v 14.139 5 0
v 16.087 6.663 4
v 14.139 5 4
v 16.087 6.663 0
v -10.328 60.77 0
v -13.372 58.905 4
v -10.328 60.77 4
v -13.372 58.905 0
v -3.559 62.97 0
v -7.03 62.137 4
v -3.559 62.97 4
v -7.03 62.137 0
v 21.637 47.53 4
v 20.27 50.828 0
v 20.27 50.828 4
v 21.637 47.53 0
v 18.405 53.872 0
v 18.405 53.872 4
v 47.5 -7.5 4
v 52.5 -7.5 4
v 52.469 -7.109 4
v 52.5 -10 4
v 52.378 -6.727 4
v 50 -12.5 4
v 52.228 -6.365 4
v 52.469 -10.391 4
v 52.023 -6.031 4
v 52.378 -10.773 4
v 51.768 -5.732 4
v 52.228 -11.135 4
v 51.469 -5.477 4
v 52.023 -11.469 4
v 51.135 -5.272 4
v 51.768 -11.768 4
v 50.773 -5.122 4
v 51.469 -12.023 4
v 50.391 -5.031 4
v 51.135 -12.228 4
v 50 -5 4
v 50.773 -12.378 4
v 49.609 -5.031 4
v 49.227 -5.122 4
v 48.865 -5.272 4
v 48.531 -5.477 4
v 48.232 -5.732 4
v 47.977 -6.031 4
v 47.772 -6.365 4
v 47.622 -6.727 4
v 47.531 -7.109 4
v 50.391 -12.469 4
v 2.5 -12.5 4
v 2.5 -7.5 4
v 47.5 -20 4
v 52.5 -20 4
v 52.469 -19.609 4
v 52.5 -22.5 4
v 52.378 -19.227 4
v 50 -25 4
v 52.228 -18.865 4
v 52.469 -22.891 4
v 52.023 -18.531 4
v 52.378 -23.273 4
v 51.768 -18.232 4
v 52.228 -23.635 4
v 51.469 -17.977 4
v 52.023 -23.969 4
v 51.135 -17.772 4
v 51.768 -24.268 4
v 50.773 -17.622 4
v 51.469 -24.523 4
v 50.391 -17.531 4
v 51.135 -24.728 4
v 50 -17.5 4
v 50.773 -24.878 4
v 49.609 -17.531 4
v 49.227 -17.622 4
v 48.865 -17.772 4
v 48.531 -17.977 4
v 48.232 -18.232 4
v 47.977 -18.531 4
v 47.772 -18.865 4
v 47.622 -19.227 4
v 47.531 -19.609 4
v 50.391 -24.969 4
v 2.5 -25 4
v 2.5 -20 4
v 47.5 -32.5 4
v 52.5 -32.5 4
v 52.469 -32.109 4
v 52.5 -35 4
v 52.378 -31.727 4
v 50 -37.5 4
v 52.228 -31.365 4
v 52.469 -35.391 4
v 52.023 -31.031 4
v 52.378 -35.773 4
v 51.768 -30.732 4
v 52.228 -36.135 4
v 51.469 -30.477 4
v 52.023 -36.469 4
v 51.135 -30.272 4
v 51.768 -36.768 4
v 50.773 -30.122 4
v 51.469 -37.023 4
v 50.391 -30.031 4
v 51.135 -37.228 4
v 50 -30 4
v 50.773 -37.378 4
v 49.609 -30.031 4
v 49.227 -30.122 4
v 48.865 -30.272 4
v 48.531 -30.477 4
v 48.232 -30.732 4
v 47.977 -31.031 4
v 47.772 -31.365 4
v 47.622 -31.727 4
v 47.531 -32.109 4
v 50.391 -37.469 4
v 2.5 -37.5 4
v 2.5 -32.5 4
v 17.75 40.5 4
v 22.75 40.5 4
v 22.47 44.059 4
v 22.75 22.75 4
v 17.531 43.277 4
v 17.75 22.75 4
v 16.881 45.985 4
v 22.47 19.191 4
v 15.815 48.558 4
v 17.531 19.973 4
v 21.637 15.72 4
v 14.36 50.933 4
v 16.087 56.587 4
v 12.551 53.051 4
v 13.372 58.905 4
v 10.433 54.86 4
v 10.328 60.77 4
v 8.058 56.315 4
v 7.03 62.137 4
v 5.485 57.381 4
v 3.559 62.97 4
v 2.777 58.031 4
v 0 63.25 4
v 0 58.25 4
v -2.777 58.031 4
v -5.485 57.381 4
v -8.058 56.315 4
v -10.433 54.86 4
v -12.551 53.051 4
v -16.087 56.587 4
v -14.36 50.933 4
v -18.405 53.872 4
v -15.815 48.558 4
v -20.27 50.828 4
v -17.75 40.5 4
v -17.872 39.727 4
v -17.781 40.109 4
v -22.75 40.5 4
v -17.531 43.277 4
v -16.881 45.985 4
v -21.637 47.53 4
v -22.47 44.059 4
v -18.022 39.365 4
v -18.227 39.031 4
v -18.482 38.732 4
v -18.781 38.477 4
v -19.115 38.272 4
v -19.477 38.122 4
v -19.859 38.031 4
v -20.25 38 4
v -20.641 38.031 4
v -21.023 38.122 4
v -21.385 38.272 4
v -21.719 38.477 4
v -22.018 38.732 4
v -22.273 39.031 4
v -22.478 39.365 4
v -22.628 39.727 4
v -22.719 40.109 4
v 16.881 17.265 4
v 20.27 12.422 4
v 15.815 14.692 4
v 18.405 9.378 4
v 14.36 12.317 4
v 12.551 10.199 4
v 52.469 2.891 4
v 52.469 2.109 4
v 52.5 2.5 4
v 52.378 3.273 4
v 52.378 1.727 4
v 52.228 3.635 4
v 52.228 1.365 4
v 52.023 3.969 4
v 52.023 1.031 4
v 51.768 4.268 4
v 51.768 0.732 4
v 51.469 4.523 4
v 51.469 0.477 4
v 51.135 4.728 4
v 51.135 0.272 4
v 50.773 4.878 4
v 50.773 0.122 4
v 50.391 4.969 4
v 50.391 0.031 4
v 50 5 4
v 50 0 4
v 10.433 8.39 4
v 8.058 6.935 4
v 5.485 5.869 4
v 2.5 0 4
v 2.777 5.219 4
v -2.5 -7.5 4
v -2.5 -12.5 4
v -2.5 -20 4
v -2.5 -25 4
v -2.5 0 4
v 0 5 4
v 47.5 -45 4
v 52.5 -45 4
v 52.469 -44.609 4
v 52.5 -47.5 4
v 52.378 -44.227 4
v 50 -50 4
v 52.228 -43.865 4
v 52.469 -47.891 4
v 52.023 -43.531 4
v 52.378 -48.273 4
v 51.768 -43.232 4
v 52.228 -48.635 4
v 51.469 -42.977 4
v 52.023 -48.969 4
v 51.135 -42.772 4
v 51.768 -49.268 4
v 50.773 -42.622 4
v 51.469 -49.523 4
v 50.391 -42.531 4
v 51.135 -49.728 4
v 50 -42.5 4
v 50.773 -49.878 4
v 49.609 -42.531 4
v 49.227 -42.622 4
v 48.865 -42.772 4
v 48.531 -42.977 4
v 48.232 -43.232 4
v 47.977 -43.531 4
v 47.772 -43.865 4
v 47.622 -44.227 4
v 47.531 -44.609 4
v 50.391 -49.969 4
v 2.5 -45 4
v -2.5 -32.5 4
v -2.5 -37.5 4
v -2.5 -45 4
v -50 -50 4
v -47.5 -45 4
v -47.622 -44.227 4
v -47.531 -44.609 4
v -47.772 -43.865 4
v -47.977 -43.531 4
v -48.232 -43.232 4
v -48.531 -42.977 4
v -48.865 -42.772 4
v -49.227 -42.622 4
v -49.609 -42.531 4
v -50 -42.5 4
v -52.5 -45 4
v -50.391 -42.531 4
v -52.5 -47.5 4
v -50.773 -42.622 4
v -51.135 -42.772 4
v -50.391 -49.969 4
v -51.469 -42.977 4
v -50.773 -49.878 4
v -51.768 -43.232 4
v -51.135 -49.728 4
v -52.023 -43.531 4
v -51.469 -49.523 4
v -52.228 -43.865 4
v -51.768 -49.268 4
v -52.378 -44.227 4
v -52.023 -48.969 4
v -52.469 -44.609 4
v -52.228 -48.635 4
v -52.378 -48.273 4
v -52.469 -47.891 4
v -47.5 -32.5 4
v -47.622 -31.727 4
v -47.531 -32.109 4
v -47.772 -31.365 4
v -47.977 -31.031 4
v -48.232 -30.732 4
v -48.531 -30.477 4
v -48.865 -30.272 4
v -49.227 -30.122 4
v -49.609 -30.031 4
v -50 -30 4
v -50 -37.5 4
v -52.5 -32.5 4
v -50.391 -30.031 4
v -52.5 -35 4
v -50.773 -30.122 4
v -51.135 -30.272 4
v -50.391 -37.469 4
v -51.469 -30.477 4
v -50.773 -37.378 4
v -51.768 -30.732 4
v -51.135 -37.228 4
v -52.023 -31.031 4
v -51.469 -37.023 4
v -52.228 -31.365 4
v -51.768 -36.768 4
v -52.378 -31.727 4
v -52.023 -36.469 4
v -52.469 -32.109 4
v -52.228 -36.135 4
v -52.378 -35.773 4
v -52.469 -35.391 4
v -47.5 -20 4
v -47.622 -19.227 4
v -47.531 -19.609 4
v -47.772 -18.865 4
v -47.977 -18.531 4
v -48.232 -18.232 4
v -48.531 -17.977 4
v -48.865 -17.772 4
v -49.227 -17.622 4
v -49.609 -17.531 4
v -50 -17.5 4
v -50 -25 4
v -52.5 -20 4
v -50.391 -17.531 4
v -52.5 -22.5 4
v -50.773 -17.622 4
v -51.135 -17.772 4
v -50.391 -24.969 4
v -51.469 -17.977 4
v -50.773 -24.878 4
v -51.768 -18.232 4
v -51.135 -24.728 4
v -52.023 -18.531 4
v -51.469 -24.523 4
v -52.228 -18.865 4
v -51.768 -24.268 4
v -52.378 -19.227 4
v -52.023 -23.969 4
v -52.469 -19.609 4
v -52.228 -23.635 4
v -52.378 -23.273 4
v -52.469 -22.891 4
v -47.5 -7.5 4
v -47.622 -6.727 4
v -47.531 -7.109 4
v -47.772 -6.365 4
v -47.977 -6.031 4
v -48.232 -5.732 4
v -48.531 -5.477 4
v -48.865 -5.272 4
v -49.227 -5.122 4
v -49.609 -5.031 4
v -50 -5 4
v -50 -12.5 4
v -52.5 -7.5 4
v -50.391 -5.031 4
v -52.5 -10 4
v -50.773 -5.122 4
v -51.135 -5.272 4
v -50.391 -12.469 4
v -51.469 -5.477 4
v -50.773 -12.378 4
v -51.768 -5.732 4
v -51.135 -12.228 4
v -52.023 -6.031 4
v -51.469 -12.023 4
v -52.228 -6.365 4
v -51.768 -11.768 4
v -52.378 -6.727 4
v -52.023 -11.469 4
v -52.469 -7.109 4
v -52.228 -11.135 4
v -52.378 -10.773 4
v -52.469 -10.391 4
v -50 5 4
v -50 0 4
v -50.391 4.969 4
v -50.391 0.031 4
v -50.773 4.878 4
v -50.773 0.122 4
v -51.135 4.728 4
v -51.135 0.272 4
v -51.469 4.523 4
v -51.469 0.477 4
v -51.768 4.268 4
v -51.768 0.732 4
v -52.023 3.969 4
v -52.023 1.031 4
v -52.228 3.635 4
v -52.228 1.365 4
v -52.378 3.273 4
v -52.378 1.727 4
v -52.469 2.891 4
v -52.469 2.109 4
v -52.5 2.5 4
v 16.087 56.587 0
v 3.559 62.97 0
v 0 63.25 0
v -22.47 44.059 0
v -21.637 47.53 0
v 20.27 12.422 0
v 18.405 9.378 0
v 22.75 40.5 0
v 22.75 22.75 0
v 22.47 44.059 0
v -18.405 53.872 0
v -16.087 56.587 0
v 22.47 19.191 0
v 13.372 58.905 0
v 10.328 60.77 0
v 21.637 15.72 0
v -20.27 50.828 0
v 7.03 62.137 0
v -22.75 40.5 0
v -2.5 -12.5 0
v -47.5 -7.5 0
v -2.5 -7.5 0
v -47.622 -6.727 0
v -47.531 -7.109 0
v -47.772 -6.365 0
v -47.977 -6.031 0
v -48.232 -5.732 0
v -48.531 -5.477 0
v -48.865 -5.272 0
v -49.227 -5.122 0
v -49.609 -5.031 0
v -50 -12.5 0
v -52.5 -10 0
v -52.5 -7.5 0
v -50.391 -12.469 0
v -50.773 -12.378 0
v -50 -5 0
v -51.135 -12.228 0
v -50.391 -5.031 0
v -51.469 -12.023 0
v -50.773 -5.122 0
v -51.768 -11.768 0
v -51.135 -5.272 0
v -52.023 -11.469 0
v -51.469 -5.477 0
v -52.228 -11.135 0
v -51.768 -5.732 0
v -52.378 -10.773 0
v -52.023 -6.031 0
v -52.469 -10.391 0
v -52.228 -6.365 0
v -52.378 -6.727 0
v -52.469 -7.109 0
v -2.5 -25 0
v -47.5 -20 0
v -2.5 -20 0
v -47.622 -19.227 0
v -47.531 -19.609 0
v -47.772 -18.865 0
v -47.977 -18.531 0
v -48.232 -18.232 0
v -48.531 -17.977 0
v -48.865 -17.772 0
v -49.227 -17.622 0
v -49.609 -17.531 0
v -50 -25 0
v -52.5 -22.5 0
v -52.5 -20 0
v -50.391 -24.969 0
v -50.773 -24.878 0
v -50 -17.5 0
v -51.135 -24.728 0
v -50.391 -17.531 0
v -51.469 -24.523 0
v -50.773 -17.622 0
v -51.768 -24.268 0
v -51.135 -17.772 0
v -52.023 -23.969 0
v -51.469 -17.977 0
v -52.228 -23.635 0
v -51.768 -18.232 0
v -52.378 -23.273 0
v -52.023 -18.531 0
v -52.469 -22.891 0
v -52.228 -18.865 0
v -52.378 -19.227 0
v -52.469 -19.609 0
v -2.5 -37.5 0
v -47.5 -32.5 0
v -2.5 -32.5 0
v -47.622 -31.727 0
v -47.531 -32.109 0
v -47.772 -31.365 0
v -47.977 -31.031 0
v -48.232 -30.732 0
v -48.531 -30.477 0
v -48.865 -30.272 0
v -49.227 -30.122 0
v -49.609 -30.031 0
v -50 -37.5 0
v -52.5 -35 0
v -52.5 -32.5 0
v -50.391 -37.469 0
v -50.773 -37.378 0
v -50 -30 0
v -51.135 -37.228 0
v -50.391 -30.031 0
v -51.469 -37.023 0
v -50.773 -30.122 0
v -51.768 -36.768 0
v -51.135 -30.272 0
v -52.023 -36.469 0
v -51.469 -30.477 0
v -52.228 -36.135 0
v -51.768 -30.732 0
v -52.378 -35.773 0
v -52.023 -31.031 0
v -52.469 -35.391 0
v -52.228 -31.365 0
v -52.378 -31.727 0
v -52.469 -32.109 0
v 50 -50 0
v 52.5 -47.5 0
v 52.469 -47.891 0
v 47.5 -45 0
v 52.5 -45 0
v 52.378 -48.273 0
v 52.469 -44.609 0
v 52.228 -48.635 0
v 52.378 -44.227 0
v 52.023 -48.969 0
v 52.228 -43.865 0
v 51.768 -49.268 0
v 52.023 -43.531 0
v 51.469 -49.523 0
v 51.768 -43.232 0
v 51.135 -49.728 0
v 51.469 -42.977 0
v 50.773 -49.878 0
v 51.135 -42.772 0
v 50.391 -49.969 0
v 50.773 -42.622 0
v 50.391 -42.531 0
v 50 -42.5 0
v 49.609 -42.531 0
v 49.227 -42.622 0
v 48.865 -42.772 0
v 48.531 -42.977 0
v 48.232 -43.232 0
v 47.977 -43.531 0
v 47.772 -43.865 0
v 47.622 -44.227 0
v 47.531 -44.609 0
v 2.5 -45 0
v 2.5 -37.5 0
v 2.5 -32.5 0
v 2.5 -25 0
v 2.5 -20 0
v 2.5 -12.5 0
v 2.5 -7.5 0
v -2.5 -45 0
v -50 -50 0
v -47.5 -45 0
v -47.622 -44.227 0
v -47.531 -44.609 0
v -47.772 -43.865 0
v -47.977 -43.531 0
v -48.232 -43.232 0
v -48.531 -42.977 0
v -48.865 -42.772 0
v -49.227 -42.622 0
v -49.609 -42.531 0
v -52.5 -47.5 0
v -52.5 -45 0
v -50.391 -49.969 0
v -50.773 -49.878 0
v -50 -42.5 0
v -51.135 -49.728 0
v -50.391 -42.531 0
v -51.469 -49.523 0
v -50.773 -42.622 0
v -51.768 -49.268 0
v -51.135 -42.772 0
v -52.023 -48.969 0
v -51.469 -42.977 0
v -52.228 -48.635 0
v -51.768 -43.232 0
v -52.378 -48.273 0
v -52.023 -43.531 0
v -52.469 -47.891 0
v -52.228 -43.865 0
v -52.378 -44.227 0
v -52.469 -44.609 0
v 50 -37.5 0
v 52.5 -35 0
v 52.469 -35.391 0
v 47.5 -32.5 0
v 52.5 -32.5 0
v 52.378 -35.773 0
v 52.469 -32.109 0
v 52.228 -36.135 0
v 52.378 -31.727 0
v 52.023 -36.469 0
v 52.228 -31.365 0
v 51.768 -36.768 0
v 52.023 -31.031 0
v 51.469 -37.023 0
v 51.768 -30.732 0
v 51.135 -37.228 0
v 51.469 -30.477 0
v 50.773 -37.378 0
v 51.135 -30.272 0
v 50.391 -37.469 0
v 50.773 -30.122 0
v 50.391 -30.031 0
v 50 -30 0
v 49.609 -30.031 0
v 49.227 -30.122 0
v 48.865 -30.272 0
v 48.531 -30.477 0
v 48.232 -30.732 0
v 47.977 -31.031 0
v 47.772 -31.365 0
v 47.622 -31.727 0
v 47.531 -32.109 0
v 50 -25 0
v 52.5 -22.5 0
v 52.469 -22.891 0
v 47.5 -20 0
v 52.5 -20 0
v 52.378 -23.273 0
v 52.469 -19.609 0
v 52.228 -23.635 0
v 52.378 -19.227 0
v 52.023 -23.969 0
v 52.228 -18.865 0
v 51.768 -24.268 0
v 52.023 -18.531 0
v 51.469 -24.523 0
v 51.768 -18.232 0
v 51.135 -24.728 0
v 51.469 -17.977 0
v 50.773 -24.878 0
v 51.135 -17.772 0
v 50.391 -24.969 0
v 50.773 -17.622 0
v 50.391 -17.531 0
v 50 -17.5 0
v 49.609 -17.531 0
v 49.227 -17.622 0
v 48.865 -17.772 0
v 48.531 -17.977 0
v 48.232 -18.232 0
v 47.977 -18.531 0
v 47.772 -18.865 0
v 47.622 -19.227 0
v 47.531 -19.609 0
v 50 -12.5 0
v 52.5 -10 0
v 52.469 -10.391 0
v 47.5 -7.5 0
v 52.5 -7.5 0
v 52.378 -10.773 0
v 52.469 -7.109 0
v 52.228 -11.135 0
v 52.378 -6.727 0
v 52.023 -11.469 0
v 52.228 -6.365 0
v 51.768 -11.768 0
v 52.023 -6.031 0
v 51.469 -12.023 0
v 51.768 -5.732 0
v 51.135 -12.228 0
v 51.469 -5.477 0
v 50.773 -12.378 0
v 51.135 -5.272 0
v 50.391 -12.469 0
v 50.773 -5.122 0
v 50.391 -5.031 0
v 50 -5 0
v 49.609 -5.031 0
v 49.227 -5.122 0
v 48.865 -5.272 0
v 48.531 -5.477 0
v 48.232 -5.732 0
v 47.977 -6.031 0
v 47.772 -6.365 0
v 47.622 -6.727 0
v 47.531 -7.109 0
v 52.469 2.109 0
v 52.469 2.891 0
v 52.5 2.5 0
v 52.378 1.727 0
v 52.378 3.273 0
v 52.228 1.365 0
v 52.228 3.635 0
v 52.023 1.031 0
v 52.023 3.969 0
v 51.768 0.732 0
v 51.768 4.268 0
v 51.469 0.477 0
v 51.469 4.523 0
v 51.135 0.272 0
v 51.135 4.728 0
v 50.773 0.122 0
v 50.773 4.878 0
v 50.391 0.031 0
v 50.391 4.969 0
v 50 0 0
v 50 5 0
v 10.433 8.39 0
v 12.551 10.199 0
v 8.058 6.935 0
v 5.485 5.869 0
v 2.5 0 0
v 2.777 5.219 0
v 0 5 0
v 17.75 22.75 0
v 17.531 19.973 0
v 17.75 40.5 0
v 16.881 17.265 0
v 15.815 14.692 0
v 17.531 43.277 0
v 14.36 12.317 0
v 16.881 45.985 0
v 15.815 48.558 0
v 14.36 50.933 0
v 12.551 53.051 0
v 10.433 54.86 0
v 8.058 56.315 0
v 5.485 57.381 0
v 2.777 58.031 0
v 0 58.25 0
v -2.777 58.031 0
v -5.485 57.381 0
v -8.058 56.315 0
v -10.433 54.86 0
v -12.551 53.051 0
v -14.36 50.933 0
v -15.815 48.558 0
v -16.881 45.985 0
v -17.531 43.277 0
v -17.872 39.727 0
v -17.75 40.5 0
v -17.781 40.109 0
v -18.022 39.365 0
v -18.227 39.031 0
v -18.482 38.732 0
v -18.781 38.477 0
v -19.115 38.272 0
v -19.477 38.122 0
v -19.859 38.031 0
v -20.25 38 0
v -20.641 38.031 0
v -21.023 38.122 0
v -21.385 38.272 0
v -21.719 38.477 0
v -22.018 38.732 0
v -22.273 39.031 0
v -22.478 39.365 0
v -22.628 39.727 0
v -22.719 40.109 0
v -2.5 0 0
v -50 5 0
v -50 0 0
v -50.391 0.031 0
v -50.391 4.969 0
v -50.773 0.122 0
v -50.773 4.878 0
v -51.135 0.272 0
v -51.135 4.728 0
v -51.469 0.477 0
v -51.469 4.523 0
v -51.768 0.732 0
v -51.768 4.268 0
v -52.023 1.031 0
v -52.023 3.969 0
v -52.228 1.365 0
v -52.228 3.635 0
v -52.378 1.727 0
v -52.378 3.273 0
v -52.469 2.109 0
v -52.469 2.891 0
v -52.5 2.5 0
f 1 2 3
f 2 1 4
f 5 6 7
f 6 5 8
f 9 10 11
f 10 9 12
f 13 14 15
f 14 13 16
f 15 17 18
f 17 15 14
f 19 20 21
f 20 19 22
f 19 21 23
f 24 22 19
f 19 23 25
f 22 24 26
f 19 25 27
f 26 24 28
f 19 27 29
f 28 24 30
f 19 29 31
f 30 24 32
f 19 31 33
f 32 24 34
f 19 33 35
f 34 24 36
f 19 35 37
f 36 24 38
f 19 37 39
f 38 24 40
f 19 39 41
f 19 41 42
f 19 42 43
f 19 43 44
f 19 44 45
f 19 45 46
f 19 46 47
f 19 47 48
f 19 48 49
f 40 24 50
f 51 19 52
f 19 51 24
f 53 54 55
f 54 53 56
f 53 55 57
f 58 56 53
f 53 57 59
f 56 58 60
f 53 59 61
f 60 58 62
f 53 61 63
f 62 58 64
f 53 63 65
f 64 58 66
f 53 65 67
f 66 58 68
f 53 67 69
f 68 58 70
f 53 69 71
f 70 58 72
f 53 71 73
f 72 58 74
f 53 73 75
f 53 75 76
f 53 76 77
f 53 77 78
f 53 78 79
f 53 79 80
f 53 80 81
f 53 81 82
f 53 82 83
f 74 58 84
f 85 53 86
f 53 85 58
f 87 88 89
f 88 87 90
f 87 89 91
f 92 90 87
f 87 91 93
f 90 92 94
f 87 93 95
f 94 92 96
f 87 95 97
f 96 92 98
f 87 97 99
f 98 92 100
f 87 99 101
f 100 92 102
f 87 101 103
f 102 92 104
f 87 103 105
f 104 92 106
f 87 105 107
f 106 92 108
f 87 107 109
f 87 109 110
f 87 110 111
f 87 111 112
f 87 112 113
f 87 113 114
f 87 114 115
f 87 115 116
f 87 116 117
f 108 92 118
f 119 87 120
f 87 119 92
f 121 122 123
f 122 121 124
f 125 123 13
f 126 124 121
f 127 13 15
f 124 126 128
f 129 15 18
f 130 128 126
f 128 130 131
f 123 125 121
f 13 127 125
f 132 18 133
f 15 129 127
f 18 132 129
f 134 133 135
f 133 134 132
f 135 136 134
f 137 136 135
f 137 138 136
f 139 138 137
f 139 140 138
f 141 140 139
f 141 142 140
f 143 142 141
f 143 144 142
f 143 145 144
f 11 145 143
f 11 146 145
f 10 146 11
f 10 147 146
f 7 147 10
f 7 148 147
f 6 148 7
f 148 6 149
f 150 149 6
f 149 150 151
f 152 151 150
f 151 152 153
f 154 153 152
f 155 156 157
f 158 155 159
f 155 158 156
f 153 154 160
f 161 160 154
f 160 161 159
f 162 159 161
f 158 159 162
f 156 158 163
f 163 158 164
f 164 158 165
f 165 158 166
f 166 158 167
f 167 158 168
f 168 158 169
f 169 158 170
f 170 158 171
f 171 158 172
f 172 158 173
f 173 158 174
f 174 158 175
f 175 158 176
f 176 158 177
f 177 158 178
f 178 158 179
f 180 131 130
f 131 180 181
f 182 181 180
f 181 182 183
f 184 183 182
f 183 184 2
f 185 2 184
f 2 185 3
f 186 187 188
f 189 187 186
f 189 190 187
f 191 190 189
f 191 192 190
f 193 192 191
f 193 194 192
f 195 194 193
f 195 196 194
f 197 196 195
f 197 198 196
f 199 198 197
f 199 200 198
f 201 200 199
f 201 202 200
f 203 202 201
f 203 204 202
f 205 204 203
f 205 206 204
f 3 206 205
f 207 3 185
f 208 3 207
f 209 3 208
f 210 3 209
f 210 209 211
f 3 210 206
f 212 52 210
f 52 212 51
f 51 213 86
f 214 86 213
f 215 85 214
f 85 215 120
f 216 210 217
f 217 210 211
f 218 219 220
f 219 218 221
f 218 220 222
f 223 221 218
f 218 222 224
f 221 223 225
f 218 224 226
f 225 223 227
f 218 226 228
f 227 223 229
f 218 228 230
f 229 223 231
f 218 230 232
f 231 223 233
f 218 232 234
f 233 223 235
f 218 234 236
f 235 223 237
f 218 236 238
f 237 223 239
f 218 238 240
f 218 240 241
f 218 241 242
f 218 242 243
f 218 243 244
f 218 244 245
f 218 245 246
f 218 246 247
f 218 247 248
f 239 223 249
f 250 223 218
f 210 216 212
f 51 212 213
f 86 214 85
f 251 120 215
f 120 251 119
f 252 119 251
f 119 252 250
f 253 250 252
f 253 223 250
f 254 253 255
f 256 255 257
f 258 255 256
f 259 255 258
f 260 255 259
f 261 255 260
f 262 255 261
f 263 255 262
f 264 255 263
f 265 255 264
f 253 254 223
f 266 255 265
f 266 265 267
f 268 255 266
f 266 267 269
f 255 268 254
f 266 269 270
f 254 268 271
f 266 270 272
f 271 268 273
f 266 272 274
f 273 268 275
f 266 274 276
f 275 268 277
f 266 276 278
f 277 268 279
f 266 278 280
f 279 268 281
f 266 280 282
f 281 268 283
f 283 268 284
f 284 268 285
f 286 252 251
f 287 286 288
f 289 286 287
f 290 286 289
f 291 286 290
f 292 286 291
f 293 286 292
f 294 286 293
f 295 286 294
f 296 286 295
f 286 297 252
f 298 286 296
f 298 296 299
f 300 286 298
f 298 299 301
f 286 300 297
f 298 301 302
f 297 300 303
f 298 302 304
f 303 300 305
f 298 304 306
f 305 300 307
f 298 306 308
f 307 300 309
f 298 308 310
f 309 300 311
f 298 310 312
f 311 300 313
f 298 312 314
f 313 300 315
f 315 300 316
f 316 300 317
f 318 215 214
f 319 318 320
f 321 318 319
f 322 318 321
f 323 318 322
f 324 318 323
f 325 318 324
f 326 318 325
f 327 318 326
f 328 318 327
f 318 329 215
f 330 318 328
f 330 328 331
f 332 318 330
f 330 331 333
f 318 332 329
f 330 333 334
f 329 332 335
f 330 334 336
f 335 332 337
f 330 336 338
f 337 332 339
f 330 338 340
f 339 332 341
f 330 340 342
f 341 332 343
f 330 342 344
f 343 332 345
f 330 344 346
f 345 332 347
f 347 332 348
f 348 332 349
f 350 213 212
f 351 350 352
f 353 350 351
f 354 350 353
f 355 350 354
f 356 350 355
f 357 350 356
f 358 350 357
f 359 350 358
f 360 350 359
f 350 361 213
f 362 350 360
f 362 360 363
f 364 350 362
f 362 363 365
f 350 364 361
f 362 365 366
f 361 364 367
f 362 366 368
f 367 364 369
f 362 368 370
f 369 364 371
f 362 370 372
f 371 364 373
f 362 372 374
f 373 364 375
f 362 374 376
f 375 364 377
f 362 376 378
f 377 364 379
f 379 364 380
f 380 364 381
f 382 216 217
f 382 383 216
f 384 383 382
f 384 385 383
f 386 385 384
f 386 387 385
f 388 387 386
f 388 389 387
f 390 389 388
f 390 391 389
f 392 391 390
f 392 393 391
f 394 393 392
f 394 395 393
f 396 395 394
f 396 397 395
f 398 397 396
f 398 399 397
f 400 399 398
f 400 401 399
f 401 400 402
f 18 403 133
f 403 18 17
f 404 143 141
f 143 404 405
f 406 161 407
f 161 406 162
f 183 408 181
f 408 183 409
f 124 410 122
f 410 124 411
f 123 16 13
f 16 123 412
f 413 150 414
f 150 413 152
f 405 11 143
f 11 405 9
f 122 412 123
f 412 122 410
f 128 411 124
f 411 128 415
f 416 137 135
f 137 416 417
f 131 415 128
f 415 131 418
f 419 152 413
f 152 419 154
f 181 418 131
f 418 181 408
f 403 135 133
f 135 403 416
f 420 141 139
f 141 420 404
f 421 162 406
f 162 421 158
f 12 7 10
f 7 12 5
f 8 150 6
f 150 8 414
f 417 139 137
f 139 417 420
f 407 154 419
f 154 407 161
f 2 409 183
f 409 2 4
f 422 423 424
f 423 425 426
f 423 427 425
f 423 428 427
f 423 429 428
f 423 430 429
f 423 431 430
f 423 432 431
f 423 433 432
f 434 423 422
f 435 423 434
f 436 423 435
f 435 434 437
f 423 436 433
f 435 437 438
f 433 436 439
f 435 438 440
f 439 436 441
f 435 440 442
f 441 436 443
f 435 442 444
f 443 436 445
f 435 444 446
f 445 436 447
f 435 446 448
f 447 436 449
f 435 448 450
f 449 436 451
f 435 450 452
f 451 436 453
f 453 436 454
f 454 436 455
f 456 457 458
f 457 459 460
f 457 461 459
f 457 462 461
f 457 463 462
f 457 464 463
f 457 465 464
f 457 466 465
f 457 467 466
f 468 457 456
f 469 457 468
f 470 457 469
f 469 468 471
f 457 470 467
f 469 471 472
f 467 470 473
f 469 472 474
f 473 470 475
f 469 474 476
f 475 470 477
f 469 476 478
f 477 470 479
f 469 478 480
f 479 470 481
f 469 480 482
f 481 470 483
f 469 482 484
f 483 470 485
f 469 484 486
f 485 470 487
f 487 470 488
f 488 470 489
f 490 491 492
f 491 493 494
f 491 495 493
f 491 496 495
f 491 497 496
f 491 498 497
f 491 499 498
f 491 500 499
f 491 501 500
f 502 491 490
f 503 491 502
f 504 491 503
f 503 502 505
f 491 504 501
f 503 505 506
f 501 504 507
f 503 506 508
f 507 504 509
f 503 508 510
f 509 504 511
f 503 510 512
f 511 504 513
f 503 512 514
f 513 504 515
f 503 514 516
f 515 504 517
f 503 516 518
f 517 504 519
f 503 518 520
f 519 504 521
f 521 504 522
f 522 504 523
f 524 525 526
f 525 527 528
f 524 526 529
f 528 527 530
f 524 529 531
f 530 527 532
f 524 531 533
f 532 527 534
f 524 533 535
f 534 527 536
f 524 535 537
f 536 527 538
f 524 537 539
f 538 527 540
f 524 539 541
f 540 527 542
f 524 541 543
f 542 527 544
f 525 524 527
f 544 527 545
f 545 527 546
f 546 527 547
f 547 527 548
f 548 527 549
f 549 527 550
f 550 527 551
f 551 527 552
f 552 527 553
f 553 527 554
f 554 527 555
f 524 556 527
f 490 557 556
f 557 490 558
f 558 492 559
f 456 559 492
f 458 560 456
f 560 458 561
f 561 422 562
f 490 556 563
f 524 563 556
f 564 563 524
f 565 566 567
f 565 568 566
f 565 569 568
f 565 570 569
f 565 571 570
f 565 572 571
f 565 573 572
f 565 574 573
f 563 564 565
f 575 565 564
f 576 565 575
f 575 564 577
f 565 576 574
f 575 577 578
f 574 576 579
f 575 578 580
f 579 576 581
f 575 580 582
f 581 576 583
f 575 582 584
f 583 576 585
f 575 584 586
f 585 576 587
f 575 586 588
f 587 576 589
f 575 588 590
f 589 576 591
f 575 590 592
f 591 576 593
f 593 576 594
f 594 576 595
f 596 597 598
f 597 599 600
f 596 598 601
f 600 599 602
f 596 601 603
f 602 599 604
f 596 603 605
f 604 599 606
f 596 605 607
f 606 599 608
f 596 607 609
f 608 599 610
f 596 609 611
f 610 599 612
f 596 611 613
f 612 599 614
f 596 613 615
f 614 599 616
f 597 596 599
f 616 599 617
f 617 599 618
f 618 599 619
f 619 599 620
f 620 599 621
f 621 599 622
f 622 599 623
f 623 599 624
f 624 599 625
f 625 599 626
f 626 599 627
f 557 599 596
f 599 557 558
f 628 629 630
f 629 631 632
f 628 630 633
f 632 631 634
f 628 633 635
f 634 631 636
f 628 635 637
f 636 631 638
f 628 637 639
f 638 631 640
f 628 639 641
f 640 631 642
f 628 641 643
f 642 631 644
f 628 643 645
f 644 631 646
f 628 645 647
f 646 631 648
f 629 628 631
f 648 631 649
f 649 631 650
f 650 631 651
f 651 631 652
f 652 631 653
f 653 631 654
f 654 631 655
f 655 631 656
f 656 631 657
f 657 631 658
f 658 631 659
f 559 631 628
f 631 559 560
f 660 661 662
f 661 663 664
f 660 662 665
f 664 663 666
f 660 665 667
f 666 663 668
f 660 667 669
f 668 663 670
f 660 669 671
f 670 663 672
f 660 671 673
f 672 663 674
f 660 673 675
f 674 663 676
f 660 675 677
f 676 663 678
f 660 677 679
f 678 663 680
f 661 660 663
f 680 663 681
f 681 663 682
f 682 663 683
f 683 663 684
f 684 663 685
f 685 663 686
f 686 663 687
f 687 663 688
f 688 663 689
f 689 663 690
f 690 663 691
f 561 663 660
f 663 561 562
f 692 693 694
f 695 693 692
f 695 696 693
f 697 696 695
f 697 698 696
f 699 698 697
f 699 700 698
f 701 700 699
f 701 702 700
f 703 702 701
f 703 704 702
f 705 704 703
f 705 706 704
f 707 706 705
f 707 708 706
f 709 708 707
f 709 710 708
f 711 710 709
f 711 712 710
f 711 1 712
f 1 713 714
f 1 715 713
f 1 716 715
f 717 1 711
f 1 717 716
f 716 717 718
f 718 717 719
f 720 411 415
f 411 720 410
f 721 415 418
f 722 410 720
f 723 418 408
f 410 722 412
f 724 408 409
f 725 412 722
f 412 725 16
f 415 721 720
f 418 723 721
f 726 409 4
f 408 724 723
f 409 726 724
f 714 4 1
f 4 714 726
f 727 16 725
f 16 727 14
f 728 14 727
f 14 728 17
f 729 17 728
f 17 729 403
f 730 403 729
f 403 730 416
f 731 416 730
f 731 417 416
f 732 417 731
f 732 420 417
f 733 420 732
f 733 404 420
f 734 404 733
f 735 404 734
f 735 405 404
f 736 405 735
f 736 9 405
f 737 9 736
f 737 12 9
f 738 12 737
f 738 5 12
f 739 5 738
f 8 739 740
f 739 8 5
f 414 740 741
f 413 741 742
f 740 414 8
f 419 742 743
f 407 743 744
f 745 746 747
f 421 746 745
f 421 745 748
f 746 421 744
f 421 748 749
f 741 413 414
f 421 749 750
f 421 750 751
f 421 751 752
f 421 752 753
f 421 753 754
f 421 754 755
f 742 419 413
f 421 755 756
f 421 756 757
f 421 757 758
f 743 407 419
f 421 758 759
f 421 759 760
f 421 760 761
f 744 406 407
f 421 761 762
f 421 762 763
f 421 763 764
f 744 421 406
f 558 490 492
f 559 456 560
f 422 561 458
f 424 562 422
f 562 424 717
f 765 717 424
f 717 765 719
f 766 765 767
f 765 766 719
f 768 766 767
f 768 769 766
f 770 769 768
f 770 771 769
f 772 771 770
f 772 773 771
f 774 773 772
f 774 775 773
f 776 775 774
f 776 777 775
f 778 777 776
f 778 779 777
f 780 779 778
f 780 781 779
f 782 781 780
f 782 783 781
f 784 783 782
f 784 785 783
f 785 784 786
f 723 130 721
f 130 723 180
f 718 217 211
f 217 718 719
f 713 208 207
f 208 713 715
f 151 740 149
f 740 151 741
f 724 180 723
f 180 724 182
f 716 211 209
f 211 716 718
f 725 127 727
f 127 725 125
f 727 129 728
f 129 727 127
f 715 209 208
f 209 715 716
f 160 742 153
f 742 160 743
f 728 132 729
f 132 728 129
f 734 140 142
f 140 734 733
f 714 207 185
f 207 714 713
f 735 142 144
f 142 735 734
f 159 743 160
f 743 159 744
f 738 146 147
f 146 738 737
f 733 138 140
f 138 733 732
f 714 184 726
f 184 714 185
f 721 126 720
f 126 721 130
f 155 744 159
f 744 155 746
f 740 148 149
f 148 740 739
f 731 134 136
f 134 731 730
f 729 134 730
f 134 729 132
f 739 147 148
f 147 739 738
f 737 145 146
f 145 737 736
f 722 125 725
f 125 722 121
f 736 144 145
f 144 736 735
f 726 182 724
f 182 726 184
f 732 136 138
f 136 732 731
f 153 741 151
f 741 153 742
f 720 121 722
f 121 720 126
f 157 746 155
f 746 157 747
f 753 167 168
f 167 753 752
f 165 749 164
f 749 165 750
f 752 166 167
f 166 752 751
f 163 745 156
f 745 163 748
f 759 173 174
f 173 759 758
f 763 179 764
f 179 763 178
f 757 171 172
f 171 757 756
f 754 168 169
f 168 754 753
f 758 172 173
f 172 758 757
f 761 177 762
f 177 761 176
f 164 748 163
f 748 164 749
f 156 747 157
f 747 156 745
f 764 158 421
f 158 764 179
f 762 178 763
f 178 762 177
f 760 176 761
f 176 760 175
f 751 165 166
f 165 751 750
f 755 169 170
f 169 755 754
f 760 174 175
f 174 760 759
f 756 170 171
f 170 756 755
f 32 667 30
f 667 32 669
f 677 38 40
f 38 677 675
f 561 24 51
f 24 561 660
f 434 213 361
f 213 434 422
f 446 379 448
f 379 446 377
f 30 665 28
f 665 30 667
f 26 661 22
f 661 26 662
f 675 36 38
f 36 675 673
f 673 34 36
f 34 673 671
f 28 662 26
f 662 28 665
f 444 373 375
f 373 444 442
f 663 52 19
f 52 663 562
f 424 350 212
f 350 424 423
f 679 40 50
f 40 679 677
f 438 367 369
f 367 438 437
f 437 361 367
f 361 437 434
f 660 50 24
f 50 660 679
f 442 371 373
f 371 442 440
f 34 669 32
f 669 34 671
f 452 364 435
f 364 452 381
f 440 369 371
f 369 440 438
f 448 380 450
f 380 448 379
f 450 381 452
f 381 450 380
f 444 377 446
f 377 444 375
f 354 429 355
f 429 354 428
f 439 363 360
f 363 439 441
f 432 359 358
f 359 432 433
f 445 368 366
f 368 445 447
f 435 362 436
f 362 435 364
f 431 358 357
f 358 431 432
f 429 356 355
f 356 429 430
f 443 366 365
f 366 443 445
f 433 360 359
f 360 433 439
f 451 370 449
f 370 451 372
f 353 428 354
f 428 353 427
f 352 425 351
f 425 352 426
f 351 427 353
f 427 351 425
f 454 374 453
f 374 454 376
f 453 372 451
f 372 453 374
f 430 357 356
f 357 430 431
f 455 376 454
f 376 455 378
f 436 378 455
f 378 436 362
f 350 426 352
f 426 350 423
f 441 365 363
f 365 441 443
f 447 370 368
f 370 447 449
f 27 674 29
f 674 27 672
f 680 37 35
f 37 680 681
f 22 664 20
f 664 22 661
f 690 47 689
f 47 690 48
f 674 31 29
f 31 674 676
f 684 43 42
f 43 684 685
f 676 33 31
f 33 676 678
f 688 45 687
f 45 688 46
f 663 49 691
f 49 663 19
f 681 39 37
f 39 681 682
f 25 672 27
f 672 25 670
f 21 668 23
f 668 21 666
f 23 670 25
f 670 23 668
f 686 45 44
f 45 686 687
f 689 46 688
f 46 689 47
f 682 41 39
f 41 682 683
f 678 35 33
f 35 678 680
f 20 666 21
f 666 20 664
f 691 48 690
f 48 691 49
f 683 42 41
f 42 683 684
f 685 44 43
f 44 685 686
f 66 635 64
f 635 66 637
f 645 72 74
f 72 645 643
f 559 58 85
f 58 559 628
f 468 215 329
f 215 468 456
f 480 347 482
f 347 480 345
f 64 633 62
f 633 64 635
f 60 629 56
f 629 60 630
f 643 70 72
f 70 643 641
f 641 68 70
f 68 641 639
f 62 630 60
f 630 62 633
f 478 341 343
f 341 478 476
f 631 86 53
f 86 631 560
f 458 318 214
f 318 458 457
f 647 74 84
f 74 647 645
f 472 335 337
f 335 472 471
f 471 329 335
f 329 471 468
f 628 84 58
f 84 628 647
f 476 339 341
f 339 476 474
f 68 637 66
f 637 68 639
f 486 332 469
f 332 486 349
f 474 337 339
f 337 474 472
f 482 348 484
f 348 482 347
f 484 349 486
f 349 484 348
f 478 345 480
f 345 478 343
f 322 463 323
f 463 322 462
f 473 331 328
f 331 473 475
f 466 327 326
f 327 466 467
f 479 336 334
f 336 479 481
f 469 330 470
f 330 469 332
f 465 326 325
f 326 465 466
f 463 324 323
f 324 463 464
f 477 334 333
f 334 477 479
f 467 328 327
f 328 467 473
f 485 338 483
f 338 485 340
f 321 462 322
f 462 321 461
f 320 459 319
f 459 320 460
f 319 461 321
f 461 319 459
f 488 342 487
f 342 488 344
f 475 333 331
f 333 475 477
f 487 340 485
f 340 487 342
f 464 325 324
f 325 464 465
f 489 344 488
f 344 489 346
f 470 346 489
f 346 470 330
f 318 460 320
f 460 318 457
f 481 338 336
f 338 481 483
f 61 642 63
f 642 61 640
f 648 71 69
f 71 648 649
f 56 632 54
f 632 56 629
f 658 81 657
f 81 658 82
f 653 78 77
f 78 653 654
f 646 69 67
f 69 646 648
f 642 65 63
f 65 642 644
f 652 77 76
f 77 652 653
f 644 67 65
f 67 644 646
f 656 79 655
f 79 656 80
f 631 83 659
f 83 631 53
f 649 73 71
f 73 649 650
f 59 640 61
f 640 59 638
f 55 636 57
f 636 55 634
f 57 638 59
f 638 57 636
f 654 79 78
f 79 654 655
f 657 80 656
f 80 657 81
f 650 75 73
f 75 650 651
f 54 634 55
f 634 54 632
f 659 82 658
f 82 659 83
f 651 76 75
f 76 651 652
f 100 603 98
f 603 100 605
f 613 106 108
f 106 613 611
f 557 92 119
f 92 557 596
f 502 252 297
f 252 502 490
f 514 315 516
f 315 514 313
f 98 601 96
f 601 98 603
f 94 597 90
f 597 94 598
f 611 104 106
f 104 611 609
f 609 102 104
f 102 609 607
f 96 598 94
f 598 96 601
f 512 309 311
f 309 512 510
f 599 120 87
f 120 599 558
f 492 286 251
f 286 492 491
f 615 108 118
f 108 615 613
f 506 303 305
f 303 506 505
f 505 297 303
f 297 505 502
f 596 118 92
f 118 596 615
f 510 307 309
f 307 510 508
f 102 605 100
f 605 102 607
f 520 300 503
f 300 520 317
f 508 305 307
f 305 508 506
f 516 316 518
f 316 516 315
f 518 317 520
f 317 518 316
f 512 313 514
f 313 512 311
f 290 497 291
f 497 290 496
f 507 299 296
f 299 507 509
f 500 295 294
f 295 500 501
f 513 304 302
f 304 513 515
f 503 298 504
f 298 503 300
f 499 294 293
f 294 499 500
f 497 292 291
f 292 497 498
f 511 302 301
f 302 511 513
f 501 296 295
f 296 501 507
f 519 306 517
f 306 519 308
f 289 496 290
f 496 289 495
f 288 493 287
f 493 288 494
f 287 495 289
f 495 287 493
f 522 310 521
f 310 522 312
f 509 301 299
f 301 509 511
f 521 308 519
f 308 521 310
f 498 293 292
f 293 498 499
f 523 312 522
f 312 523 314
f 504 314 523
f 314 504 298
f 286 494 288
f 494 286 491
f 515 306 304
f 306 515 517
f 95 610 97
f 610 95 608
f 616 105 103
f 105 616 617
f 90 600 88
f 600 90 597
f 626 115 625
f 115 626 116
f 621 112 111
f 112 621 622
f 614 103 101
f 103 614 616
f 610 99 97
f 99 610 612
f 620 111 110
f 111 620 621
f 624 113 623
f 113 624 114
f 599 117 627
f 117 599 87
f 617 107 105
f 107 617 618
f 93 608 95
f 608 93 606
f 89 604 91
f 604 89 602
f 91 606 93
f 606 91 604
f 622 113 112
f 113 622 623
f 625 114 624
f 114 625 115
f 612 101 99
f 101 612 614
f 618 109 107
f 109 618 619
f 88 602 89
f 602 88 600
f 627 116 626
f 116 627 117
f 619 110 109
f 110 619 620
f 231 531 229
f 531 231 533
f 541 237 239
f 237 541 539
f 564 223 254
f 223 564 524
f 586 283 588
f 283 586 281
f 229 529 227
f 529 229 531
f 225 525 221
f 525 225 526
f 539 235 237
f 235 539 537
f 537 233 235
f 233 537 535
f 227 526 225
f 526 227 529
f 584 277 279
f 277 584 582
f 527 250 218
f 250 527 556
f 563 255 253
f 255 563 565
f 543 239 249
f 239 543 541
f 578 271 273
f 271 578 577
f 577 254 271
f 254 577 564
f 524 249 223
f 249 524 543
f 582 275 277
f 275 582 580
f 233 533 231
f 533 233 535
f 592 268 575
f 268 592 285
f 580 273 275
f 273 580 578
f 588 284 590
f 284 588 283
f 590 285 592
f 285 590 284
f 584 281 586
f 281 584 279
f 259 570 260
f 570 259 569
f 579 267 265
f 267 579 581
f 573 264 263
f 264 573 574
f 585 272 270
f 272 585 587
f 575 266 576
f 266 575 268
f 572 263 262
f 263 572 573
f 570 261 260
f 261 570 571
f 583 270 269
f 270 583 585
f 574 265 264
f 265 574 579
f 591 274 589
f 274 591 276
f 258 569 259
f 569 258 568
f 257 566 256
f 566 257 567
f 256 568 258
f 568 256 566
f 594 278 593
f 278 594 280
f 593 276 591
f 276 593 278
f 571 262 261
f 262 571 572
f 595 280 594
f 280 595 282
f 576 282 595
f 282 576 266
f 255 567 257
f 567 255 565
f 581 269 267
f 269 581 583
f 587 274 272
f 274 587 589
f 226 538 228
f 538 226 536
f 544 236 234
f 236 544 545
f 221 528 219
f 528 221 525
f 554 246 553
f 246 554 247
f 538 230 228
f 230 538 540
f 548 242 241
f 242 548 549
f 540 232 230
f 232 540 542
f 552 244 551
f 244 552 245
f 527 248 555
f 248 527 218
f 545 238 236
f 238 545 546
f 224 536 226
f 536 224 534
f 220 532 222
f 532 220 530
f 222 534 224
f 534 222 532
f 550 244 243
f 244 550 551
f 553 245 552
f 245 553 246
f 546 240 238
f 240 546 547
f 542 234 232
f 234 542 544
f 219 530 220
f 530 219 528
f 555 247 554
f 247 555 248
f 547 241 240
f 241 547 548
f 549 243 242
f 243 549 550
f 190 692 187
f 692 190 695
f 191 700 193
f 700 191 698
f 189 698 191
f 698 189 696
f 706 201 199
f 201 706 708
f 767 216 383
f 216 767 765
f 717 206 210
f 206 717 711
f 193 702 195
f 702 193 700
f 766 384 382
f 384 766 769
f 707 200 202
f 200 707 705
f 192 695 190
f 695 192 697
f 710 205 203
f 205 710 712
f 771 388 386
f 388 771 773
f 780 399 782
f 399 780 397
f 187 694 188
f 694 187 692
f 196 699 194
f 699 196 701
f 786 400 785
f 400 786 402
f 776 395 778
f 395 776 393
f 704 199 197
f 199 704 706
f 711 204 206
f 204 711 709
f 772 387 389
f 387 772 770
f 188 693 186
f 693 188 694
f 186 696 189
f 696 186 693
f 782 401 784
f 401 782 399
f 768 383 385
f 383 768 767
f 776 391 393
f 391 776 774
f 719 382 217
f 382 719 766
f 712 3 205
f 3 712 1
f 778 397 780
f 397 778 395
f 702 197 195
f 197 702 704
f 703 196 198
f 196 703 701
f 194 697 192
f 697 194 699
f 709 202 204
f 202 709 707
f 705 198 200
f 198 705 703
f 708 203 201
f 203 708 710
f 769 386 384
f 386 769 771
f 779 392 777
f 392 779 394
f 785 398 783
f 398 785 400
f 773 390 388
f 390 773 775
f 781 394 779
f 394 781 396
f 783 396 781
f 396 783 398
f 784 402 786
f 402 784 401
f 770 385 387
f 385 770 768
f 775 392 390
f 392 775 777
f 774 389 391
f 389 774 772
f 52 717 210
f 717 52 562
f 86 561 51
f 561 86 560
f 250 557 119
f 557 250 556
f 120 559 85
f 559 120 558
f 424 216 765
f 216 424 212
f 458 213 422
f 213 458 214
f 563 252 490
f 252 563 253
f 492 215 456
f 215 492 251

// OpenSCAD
/* [General] */

// Thickness of the part in the Z dimension. Increase to make a sturdier part.
thickness=4; // [2:10]

// Thickness of the walls in the X and Y dimensions. Increase to make a sturdier part.
wall_thickness=5; // [3:8]


/* [Hook] */

// Inner diameter of the hook. Recommended to set this at least 0.5mm larger than the target rod.
hook_size=35.5; // [2:0.5:100]

// How much extra space to put in the hook opening. If set to 0, the opening will be exactly the same as Hook Size. Positive values will result in a larger opening, negative values will result in a smaller opening. Values lower than -(Hook Size / 2) would violate the geometry of the hook, so will automatically be changed to the lowest valid value.
hook_extra_space=0; // [-50:50]


/* [Tie Sections] */

// The number of tie rows on the hanger.
tie_count=4; // [1:20]

// Whether or not the hanger is double-sided.
double_sided=true; // [true,false]

// The width of each tie section flat area.
tie_section_width=40; // [20:60]

// The height of the hook at the end of each tie section.
tie_section_hook_height=2.5; // [1:0.5:5]

// The height of the gap above the tie section hook. Too small values will make it difficult to use.
tie_section_gap_height=5; // [1:10]

// Only works when Double Sided = true. Shift each layer of the tie section outward by this amount so that the ties are staggered.
tie_section_shift=0; // [0:50]


//Calculated
top_bar_y=wall_thickness/2;
each_bar_y_multiplier=-(wall_thickness+tie_section_hook_height+tie_section_gap_height);
tie_section_left_x=double_sided?(-(tie_section_width+wall_thickness*2)):-(tie_section_width+wall_thickness*2)/2;
tie_section_right_x=double_sided?(tie_section_width+wall_thickness*2):(tie_section_width+wall_thickness*2)/2;
real_hook_extra_space=(hook_extra_space<-(hook_size/2))?-(hook_size/2):hook_extra_space;


union() {
    // Main hook
    union() {
        
        // Hook surround
        difference() {
            // Outside
            hull() {
                // Bottom of hook should be at 0,0
                translate([0,hook_size/2+wall_thickness,0]) cylinder(d=hook_size+wall_thickness*2,h=thickness,$fn=40);
                // Top of the hook should be above
                translate([0,hook_size/2+wall_thickness+hook_size/2+real_hook_extra_space,0]) cylinder(d=hook_size+wall_thickness*2,h=thickness,$fn=40);
            }
            // Inside (subtracted)
            hull() {
                translate([0,hook_size/2+wall_thickness,0]) cylinder(d=hook_size,h=thickness*3,center=true,$fn=40);
                translate([0,hook_size/2+wall_thickness+hook_size/2+real_hook_extra_space,0]) cylinder(d=hook_size,h=thickness*3,center=true,$fn=40);
            }
            // Opening (subtracted)
            translate([-(hook_size/2+wall_thickness+1),0,-1]) cube([hook_size/2+wall_thickness+1,hook_size+wall_thickness*1+real_hook_extra_space,thickness*3]);
        }
        
        // Ball on end of hook
        translate([-(hook_size+wall_thickness)/2,(hook_size+wall_thickness+real_hook_extra_space),0]) cylinder(d=wall_thickness,h=thickness,$fn=40);
    }
    
    // Straight across top bar
    translate([0,top_bar_y,0]) {
        hull() {
            translate([tie_section_left_x,0,0]) cylinder(d=wall_thickness,h=thickness,$fn=40);
            translate([tie_section_right_x,0,0]) cylinder(d=wall_thickness,h=thickness,$fn=40);
        }
    }
    
    middle_support_x=double_sided?0:(tie_section_width+wall_thickness*2)/2;
    middle_support_left_x=double_sided?middle_support_x-tie_count*tie_section_shift:middle_support_x;
    middle_support_right_x=double_sided?middle_support_x+tie_count*tie_section_shift:middle_support_x;
    // Middle support 1 (left)
    hull() {
        translate([middle_support_x,top_bar_y,0]) cylinder(d=wall_thickness,h=thickness,$fn=40);
        translate([middle_support_left_x,top_bar_y+tie_count*each_bar_y_multiplier,0]) cylinder(d=wall_thickness,h=thickness,$fn=40);
    }
    // Middle support 2 (right)
    hull() {
        translate([middle_support_x,top_bar_y,0]) cylinder(d=wall_thickness,h=thickness,$fn=40);
        translate([middle_support_right_x,top_bar_y+tie_count*each_bar_y_multiplier,0]) cylinder(d=wall_thickness,h=thickness,$fn=40);
    }
    
    // Each tie section
    for (i = [1:tie_count]) {
        this_section_left_x=double_sided?tie_section_left_x-(i*tie_section_shift):tie_section_left_x;
        this_section_right_x=double_sided?tie_section_right_x+(i*tie_section_shift):tie_section_right_x;
        translate([0,top_bar_y + (i*each_bar_y_multiplier),0]) {
            // Cross bar for tie section
            hull() {
                translate([this_section_left_x,0,0]) cylinder(d=wall_thickness,h=thickness,$fn=40);
                translate([this_section_right_x,0,0]) cylinder(d=wall_thickness,h=thickness,$fn=40);
            }
            // Left hook
            hull() {
                translate([this_section_left_x,0,0]) cylinder(d=wall_thickness,h=thickness,$fn=40);
                translate([this_section_left_x,tie_section_hook_height,0]) cylinder(d=wall_thickness,h=thickness,$fn=40);
            }
            // Right hook
            hull() {
                translate([this_section_right_x,0,0]) cylinder(d=wall_thickness,h=thickness,$fn=40);
                translate([this_section_right_x,tie_section_hook_height,0]) cylinder(d=wall_thickness,h=thickness,$fn=40);
            }
        }
    }
}
